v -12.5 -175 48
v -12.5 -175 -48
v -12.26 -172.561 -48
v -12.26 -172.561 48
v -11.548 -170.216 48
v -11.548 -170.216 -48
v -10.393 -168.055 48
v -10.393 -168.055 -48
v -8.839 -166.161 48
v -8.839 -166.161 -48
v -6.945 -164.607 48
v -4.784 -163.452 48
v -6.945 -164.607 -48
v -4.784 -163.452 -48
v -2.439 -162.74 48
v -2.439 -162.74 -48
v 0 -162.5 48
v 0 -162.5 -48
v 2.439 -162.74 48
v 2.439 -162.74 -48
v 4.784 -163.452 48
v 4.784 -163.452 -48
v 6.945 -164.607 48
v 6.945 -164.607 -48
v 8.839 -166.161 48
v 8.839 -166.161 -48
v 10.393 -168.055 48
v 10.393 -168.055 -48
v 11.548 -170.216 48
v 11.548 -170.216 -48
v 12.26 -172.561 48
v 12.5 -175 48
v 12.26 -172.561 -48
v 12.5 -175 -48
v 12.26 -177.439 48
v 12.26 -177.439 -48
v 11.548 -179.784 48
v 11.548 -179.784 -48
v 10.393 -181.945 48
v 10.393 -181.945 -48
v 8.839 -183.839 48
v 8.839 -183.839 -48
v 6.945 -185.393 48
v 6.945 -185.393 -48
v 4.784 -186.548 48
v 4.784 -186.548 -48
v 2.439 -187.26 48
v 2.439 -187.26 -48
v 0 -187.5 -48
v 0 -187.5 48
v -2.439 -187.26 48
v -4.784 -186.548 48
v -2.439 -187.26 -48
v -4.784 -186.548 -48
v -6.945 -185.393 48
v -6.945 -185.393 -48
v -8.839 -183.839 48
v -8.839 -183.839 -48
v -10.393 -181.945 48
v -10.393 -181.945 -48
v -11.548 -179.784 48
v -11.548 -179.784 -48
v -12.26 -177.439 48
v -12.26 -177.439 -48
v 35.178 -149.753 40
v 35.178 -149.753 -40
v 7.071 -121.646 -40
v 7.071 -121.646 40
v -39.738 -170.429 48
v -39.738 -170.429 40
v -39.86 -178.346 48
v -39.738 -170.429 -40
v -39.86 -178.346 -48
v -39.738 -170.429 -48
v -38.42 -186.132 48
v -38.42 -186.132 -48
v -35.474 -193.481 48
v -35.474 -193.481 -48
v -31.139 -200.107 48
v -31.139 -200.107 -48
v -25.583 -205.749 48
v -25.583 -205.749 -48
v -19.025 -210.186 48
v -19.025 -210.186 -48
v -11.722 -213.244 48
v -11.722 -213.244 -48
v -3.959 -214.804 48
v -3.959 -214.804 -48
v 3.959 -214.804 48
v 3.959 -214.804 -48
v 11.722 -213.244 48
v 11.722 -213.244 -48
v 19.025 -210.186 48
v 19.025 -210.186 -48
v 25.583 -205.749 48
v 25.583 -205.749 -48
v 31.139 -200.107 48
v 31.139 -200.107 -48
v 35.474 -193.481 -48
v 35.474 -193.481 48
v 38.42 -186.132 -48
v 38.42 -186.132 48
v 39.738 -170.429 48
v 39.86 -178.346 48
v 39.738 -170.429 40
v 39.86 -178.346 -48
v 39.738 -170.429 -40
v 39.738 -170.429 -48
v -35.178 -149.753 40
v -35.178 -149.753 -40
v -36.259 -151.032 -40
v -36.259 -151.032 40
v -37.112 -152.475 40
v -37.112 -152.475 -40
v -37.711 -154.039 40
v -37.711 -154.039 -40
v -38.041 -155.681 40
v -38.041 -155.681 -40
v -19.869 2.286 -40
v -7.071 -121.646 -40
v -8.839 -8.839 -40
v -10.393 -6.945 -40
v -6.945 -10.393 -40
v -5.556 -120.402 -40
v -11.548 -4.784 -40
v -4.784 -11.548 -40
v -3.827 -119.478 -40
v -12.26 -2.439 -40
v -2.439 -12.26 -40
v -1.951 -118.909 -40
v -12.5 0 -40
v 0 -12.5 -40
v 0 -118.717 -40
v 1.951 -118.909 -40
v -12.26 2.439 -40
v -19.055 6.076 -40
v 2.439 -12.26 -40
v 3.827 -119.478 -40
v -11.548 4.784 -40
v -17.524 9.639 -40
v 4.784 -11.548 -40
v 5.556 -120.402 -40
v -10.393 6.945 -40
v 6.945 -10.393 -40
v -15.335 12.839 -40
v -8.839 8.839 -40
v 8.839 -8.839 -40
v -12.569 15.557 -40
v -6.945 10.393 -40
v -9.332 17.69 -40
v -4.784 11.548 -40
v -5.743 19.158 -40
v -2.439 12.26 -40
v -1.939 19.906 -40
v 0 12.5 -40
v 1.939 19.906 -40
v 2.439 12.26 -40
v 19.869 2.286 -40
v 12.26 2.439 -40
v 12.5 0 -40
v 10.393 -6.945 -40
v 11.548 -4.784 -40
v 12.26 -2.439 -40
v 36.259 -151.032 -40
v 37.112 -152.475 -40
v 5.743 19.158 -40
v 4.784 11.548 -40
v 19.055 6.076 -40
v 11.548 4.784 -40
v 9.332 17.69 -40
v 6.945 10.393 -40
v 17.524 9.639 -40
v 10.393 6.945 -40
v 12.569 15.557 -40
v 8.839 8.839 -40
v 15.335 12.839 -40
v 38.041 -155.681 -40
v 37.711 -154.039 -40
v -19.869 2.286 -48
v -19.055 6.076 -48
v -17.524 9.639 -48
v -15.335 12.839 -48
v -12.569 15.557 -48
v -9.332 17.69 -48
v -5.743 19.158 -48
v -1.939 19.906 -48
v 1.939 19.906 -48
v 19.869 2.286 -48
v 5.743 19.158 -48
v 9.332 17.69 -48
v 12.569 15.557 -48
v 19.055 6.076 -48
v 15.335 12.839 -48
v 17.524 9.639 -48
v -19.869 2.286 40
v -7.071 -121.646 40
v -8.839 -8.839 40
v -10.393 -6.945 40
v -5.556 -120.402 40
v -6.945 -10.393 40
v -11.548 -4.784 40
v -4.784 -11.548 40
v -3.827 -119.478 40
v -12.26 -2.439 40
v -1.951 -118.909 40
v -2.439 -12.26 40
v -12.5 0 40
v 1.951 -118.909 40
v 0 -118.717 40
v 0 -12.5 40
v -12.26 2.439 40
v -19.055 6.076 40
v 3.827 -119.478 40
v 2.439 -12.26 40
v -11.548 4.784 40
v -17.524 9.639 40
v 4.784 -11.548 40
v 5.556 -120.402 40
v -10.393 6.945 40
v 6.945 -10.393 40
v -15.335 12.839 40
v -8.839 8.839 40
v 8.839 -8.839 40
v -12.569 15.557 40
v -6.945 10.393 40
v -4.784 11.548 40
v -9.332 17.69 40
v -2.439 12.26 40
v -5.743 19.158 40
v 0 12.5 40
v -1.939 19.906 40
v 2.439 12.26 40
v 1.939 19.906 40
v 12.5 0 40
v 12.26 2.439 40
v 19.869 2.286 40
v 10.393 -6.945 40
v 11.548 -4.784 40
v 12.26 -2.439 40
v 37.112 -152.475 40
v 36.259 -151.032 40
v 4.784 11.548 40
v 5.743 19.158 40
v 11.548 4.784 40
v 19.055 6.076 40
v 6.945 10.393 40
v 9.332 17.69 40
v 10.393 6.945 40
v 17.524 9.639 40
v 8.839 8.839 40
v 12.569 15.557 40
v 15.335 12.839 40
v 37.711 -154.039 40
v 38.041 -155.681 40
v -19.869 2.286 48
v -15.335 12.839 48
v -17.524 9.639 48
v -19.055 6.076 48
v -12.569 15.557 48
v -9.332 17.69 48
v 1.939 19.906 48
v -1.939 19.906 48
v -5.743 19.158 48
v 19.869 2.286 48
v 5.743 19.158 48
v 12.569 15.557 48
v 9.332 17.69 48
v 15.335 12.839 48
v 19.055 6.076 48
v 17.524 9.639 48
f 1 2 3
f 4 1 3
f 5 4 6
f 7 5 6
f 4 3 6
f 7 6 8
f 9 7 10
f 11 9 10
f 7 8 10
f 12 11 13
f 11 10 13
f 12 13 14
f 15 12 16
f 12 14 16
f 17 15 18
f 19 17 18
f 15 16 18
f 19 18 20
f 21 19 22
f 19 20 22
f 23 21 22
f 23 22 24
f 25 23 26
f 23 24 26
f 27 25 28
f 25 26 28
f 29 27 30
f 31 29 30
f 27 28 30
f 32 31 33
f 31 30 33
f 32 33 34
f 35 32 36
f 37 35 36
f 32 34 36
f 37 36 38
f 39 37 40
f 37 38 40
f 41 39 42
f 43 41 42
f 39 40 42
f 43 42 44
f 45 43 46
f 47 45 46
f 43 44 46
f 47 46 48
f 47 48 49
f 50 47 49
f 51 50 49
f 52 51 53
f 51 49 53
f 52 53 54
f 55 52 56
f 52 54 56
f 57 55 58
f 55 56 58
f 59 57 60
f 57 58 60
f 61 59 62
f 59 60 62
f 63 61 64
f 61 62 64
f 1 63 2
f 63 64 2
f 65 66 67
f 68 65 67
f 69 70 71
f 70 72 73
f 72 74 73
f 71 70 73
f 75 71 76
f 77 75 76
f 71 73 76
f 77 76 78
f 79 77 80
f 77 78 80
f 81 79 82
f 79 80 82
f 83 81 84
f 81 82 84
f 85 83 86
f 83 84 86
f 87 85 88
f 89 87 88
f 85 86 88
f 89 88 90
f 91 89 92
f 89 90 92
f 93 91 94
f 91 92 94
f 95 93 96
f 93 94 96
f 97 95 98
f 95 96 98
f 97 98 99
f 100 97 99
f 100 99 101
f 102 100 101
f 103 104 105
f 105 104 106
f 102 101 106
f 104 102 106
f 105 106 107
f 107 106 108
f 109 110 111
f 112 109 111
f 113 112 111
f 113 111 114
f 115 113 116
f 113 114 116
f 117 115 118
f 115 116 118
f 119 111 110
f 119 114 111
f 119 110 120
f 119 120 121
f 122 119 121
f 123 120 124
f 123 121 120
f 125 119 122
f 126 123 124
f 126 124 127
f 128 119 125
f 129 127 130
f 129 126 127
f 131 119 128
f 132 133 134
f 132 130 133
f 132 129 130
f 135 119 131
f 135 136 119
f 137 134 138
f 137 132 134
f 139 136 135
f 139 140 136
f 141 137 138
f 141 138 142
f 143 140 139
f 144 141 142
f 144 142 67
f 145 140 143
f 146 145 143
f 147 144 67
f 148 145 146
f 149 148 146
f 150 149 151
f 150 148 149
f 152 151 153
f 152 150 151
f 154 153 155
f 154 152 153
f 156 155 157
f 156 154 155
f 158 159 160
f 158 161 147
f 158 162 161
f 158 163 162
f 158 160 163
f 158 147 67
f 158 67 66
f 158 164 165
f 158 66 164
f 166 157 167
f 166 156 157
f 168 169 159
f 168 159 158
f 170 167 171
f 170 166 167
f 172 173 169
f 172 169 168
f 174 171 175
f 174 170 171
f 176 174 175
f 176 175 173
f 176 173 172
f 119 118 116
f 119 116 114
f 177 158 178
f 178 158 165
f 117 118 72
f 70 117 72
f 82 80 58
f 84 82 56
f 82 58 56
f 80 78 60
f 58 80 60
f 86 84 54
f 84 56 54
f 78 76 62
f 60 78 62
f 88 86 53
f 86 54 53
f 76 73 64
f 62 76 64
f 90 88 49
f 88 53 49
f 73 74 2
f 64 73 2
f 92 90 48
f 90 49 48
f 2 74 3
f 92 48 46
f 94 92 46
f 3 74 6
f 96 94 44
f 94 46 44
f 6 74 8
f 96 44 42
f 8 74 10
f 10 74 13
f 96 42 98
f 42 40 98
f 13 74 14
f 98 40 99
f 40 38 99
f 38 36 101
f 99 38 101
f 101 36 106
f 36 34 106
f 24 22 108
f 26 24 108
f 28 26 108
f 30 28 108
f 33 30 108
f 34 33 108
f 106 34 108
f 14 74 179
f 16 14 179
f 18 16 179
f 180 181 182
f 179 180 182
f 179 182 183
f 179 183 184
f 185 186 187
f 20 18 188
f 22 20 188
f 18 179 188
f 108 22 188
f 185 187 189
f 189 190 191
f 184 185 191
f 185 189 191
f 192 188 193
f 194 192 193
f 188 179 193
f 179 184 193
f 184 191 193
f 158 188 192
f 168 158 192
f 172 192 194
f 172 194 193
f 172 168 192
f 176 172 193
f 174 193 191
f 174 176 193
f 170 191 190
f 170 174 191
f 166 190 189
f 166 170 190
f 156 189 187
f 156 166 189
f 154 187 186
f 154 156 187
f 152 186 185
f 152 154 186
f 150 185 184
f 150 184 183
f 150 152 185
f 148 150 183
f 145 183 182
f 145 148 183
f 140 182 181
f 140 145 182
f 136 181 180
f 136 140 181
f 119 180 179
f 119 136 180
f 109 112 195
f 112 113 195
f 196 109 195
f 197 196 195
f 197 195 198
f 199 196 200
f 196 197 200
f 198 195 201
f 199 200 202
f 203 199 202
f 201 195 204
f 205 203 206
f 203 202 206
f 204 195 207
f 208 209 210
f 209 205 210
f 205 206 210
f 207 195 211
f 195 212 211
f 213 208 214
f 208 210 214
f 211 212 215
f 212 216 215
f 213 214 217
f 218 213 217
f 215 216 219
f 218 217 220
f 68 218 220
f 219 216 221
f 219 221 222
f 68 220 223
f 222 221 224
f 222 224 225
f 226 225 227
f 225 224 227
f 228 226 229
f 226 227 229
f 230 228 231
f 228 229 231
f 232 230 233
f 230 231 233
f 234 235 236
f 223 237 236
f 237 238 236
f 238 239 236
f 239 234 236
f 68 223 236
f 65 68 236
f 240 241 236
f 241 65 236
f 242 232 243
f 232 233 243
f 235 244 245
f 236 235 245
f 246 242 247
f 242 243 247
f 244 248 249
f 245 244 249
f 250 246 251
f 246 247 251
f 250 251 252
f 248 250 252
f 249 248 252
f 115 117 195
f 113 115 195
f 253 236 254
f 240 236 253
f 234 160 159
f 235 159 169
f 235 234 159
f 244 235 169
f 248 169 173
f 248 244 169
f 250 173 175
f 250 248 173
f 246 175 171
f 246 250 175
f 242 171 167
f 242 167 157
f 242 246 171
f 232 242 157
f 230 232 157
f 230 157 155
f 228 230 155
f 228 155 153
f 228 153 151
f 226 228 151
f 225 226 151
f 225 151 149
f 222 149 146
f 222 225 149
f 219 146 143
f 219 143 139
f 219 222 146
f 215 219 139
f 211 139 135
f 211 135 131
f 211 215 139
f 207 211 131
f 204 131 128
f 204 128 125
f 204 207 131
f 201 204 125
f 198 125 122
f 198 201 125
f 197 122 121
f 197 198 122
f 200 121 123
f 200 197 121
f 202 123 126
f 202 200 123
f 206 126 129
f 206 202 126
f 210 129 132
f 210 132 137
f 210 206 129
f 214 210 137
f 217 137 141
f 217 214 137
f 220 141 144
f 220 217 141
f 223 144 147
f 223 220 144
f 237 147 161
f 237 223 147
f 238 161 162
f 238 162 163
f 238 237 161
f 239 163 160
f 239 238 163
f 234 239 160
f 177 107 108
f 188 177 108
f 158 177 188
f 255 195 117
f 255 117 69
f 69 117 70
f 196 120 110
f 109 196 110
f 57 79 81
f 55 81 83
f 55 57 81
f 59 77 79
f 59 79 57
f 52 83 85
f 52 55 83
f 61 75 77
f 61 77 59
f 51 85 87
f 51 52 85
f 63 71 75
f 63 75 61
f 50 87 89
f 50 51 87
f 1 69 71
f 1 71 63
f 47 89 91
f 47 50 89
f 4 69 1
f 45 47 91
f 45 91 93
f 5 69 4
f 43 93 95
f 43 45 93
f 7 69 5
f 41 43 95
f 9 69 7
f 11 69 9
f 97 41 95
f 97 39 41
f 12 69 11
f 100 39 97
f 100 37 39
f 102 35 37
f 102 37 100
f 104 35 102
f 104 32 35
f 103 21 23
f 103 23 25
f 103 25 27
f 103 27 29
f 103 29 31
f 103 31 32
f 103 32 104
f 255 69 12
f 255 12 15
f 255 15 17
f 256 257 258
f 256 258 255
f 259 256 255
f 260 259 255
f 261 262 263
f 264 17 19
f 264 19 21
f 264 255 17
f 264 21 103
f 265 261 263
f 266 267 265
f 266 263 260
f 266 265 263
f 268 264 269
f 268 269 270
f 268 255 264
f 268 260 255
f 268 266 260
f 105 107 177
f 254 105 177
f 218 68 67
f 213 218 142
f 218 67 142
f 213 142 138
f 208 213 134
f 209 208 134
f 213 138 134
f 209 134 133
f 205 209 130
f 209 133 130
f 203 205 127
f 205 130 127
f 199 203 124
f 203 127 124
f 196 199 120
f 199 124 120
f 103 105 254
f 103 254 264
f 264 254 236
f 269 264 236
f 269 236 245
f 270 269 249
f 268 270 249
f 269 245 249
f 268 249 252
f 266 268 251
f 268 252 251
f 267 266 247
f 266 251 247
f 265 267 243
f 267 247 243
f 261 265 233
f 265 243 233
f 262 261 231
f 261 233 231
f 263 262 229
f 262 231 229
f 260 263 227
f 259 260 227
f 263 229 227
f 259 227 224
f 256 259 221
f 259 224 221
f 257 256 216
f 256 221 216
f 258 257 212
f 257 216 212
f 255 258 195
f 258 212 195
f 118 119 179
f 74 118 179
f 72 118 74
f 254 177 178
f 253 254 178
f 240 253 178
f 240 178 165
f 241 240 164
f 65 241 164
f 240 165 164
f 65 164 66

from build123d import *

# Parameters (mm, degrees)
SKETCH1_R           = 12.5
BOSS_EXTRUDE1_DEPTH = 40
BOSS_EXTRUDE2_DEPTH = 8
BOSS_EXTRUDE3_DEPTH = 80
SKETCH5_R           = 12.5
CUT_EXTRUDE1_DEPTH  = 96


with BuildPart() as part:
    # Sketch1 → Boss-Extrude1 (new, symmetric)
    with BuildSketch(Plane.XY):
        Circle(SKETCH1_R)
    extrude(amount=BOSS_EXTRUDE1_DEPTH, both=True)

    # Sketch2 → Boss-Extrude2 (add)
    with BuildSketch(Plane.XY.offset(40)):
        with BuildLine():
            Line((-19.868958458, 2.285714286), (-39.737916916, -170.428571429))
            ThreePointArc((-39.737916916, -170.428571429), (0, -215), (39.737916916, -170.428571429))
            Line((39.737916916, -170.428571429), (19.868958458, 2.285714286))
            ThreePointArc((19.868958458, 2.285714286), (0, 20), (-19.868958458, 2.285714286))
        make_face()
    boss_extrude2 = extrude(amount=BOSS_EXTRUDE2_DEPTH)

    # Mirror1: Boss-Extrude2 across plane
    add(boss_extrude2.mirror(Plane.XY))

    # Sketch4 → Boss-Extrude3 (add)
    with BuildSketch(Plane.XY.offset(-40)):
        with BuildLine():
            Line((-7.071067812, -121.645919803), (-35.177954833, -149.752806824))
            ThreePointArc((-35.177954833, -149.752806824), (-37.111501281, -152.47451583), (-38.04136625, -155.681017493))
            Line((-38.04136625, -155.681017493), (-39.737916916, -170.428571429))
            ThreePointArc((-39.737916916, -170.428571429), (0, -215), (39.737916916, -170.428571429))
            Line((39.737916916, -170.428571429), (38.04136625, -155.681017493))
            ThreePointArc((38.04136625, -155.681017493), (37.111501281, -152.47451583), (35.177954833, -149.752806824))
            Line((35.177954833, -149.752806824), (7.071067812, -121.645919803))
            ThreePointArc((7.071067812, -121.645919803), (0, -118.716987615), (-7.071067812, -121.645919803))
        make_face()
    extrude(amount=BOSS_EXTRUDE3_DEPTH)

    # Sketch5 → Cut-Extrude1 (cut)
    with BuildSketch(Plane(origin=(0, 0, -48), x_dir=(-1, 0, 0), z_dir=(0, 0, -1))):
        with Locations((0, -175)):
            Circle(SKETCH5_R)
    extrude(amount=-CUT_EXTRUDE1_DEPTH, mode=Mode.SUBTRACT)


solid = part.part
